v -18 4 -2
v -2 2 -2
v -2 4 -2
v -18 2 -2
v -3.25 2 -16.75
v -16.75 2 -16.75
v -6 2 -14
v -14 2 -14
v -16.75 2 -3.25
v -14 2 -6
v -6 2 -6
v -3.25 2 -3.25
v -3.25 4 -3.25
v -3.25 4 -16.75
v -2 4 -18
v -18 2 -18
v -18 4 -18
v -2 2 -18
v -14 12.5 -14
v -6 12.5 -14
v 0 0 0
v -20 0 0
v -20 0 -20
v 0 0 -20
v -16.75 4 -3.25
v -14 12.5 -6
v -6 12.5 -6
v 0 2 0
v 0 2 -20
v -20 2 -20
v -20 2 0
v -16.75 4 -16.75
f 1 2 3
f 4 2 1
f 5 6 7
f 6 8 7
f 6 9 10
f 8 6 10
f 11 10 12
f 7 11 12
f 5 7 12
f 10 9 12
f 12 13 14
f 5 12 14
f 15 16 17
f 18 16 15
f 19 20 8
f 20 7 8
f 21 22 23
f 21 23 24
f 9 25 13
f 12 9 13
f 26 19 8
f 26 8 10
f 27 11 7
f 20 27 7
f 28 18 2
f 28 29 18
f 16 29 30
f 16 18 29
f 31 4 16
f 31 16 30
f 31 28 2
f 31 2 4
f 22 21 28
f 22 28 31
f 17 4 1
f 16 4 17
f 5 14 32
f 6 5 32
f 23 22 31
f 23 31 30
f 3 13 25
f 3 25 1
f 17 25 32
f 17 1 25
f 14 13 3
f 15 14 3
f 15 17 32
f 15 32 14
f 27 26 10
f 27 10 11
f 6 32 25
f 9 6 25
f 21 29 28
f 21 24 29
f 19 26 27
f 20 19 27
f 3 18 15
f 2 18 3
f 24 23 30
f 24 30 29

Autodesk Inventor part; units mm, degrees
ref_plane "YZ Plane" through (0, 0, 0) normal (1, 0, 0) x (0, 1, 0)
ref_plane "XZ Plane" through (0, 0, 0) normal (0, 1, 0) x (-1, 0, 0)
ref_plane "XY Plane" through (0, 0, 0) normal (0, 0, 1) x (1, 0, 0)
sketch "Sketch1" plane through (0, 0, 0) normal (0, 1, 0) x (-1, 0, 0)
  line L0 (0, 0) -> (20, 0)
  line L1 (20, 0) -> (20, -20)
  line L2 (20, -20) -> (0, -20)
  line L3 (0, -20) -> (0, 0)
  dimension "d0" = 20
  dimension "d1" = 20
extrude "Extrusion1" add sketch "Sketch1" along normal blind 2
sketch "Sketch2" plane through (0, 2, 0) normal (0, 1, 0) x (1, 0, 0)
  line L0 (0, 20) -> (-20, 20) projected
  line L1 (-20, 20) -> (-20, 0) projected
  line L2 (-20, 0) -> (0, 0) projected
  line L3 (0, 0) -> (0, 20) projected
  line L4 (-18, 2) -> (-18, 18)
  line L5 (-18, 18) -> (-2, 18)
  line L6 (-2, 18) -> (-2, 2)
  line L7 (-2, 2) -> (-18, 2)
  line L8 (-16.75, 16.75) -> (-16.75, 3.25)
  line L9 (-16.75, 3.25) -> (-3.25, 3.25)
  line L10 (-3.25, 3.25) -> (-3.25, 16.75)
  line L11 (-3.25, 16.75) -> (-16.75, 16.75)
  dimension "d4" = 2
  dimension "d5" = 1.25
extrude "Extrusion2" add sketch "Sketch2" along normal blind 2 contours L4 L5 L6 L7
extrude "Extrusion3" cut sketch "Sketch2" against normal blind 10 contours L11 L10 L9 L8
sketch "Sketch3" plane through (0, 0, 0) normal (0, -1, 0) x (1, 0, 0)
  line L0 (-3.25, -3.25) -> (-3.25, -16.75) projected
  line L1 (-3.25, -16.75) -> (-16.75, -16.75) projected
  line L2 (-16.75, -16.75) -> (-16.75, -3.25) projected
  line L3 (-16.75, -3.25) -> (-3.25, -3.25) projected
  line L4 (0, -20) -> (-20, -20) projected
  line L5 (0, 0) -> (0, -20) projected
  line L6 (-20, 0) -> (0, 0) projected
  line L7 (-20, -20) -> (-20, 0) projected
  line L8 (-6, -6) -> (-6, -14)
  line L9 (-6, -14) -> (-14, -14)
  line L10 (-14, -14) -> (-14, -6)
  line L11 (-14, -6) -> (-6, -6)
extrude "Extrusion4" add sketch "Sketch3" against normal up to surface (2 mm away) contours L0 L1 L2 L3
extrude "Extrusion5" add sketch "Sketch3" against normal blind 12.5 contours L8 L9 L10 L11
properties part number "latticeChamberCapv4"
